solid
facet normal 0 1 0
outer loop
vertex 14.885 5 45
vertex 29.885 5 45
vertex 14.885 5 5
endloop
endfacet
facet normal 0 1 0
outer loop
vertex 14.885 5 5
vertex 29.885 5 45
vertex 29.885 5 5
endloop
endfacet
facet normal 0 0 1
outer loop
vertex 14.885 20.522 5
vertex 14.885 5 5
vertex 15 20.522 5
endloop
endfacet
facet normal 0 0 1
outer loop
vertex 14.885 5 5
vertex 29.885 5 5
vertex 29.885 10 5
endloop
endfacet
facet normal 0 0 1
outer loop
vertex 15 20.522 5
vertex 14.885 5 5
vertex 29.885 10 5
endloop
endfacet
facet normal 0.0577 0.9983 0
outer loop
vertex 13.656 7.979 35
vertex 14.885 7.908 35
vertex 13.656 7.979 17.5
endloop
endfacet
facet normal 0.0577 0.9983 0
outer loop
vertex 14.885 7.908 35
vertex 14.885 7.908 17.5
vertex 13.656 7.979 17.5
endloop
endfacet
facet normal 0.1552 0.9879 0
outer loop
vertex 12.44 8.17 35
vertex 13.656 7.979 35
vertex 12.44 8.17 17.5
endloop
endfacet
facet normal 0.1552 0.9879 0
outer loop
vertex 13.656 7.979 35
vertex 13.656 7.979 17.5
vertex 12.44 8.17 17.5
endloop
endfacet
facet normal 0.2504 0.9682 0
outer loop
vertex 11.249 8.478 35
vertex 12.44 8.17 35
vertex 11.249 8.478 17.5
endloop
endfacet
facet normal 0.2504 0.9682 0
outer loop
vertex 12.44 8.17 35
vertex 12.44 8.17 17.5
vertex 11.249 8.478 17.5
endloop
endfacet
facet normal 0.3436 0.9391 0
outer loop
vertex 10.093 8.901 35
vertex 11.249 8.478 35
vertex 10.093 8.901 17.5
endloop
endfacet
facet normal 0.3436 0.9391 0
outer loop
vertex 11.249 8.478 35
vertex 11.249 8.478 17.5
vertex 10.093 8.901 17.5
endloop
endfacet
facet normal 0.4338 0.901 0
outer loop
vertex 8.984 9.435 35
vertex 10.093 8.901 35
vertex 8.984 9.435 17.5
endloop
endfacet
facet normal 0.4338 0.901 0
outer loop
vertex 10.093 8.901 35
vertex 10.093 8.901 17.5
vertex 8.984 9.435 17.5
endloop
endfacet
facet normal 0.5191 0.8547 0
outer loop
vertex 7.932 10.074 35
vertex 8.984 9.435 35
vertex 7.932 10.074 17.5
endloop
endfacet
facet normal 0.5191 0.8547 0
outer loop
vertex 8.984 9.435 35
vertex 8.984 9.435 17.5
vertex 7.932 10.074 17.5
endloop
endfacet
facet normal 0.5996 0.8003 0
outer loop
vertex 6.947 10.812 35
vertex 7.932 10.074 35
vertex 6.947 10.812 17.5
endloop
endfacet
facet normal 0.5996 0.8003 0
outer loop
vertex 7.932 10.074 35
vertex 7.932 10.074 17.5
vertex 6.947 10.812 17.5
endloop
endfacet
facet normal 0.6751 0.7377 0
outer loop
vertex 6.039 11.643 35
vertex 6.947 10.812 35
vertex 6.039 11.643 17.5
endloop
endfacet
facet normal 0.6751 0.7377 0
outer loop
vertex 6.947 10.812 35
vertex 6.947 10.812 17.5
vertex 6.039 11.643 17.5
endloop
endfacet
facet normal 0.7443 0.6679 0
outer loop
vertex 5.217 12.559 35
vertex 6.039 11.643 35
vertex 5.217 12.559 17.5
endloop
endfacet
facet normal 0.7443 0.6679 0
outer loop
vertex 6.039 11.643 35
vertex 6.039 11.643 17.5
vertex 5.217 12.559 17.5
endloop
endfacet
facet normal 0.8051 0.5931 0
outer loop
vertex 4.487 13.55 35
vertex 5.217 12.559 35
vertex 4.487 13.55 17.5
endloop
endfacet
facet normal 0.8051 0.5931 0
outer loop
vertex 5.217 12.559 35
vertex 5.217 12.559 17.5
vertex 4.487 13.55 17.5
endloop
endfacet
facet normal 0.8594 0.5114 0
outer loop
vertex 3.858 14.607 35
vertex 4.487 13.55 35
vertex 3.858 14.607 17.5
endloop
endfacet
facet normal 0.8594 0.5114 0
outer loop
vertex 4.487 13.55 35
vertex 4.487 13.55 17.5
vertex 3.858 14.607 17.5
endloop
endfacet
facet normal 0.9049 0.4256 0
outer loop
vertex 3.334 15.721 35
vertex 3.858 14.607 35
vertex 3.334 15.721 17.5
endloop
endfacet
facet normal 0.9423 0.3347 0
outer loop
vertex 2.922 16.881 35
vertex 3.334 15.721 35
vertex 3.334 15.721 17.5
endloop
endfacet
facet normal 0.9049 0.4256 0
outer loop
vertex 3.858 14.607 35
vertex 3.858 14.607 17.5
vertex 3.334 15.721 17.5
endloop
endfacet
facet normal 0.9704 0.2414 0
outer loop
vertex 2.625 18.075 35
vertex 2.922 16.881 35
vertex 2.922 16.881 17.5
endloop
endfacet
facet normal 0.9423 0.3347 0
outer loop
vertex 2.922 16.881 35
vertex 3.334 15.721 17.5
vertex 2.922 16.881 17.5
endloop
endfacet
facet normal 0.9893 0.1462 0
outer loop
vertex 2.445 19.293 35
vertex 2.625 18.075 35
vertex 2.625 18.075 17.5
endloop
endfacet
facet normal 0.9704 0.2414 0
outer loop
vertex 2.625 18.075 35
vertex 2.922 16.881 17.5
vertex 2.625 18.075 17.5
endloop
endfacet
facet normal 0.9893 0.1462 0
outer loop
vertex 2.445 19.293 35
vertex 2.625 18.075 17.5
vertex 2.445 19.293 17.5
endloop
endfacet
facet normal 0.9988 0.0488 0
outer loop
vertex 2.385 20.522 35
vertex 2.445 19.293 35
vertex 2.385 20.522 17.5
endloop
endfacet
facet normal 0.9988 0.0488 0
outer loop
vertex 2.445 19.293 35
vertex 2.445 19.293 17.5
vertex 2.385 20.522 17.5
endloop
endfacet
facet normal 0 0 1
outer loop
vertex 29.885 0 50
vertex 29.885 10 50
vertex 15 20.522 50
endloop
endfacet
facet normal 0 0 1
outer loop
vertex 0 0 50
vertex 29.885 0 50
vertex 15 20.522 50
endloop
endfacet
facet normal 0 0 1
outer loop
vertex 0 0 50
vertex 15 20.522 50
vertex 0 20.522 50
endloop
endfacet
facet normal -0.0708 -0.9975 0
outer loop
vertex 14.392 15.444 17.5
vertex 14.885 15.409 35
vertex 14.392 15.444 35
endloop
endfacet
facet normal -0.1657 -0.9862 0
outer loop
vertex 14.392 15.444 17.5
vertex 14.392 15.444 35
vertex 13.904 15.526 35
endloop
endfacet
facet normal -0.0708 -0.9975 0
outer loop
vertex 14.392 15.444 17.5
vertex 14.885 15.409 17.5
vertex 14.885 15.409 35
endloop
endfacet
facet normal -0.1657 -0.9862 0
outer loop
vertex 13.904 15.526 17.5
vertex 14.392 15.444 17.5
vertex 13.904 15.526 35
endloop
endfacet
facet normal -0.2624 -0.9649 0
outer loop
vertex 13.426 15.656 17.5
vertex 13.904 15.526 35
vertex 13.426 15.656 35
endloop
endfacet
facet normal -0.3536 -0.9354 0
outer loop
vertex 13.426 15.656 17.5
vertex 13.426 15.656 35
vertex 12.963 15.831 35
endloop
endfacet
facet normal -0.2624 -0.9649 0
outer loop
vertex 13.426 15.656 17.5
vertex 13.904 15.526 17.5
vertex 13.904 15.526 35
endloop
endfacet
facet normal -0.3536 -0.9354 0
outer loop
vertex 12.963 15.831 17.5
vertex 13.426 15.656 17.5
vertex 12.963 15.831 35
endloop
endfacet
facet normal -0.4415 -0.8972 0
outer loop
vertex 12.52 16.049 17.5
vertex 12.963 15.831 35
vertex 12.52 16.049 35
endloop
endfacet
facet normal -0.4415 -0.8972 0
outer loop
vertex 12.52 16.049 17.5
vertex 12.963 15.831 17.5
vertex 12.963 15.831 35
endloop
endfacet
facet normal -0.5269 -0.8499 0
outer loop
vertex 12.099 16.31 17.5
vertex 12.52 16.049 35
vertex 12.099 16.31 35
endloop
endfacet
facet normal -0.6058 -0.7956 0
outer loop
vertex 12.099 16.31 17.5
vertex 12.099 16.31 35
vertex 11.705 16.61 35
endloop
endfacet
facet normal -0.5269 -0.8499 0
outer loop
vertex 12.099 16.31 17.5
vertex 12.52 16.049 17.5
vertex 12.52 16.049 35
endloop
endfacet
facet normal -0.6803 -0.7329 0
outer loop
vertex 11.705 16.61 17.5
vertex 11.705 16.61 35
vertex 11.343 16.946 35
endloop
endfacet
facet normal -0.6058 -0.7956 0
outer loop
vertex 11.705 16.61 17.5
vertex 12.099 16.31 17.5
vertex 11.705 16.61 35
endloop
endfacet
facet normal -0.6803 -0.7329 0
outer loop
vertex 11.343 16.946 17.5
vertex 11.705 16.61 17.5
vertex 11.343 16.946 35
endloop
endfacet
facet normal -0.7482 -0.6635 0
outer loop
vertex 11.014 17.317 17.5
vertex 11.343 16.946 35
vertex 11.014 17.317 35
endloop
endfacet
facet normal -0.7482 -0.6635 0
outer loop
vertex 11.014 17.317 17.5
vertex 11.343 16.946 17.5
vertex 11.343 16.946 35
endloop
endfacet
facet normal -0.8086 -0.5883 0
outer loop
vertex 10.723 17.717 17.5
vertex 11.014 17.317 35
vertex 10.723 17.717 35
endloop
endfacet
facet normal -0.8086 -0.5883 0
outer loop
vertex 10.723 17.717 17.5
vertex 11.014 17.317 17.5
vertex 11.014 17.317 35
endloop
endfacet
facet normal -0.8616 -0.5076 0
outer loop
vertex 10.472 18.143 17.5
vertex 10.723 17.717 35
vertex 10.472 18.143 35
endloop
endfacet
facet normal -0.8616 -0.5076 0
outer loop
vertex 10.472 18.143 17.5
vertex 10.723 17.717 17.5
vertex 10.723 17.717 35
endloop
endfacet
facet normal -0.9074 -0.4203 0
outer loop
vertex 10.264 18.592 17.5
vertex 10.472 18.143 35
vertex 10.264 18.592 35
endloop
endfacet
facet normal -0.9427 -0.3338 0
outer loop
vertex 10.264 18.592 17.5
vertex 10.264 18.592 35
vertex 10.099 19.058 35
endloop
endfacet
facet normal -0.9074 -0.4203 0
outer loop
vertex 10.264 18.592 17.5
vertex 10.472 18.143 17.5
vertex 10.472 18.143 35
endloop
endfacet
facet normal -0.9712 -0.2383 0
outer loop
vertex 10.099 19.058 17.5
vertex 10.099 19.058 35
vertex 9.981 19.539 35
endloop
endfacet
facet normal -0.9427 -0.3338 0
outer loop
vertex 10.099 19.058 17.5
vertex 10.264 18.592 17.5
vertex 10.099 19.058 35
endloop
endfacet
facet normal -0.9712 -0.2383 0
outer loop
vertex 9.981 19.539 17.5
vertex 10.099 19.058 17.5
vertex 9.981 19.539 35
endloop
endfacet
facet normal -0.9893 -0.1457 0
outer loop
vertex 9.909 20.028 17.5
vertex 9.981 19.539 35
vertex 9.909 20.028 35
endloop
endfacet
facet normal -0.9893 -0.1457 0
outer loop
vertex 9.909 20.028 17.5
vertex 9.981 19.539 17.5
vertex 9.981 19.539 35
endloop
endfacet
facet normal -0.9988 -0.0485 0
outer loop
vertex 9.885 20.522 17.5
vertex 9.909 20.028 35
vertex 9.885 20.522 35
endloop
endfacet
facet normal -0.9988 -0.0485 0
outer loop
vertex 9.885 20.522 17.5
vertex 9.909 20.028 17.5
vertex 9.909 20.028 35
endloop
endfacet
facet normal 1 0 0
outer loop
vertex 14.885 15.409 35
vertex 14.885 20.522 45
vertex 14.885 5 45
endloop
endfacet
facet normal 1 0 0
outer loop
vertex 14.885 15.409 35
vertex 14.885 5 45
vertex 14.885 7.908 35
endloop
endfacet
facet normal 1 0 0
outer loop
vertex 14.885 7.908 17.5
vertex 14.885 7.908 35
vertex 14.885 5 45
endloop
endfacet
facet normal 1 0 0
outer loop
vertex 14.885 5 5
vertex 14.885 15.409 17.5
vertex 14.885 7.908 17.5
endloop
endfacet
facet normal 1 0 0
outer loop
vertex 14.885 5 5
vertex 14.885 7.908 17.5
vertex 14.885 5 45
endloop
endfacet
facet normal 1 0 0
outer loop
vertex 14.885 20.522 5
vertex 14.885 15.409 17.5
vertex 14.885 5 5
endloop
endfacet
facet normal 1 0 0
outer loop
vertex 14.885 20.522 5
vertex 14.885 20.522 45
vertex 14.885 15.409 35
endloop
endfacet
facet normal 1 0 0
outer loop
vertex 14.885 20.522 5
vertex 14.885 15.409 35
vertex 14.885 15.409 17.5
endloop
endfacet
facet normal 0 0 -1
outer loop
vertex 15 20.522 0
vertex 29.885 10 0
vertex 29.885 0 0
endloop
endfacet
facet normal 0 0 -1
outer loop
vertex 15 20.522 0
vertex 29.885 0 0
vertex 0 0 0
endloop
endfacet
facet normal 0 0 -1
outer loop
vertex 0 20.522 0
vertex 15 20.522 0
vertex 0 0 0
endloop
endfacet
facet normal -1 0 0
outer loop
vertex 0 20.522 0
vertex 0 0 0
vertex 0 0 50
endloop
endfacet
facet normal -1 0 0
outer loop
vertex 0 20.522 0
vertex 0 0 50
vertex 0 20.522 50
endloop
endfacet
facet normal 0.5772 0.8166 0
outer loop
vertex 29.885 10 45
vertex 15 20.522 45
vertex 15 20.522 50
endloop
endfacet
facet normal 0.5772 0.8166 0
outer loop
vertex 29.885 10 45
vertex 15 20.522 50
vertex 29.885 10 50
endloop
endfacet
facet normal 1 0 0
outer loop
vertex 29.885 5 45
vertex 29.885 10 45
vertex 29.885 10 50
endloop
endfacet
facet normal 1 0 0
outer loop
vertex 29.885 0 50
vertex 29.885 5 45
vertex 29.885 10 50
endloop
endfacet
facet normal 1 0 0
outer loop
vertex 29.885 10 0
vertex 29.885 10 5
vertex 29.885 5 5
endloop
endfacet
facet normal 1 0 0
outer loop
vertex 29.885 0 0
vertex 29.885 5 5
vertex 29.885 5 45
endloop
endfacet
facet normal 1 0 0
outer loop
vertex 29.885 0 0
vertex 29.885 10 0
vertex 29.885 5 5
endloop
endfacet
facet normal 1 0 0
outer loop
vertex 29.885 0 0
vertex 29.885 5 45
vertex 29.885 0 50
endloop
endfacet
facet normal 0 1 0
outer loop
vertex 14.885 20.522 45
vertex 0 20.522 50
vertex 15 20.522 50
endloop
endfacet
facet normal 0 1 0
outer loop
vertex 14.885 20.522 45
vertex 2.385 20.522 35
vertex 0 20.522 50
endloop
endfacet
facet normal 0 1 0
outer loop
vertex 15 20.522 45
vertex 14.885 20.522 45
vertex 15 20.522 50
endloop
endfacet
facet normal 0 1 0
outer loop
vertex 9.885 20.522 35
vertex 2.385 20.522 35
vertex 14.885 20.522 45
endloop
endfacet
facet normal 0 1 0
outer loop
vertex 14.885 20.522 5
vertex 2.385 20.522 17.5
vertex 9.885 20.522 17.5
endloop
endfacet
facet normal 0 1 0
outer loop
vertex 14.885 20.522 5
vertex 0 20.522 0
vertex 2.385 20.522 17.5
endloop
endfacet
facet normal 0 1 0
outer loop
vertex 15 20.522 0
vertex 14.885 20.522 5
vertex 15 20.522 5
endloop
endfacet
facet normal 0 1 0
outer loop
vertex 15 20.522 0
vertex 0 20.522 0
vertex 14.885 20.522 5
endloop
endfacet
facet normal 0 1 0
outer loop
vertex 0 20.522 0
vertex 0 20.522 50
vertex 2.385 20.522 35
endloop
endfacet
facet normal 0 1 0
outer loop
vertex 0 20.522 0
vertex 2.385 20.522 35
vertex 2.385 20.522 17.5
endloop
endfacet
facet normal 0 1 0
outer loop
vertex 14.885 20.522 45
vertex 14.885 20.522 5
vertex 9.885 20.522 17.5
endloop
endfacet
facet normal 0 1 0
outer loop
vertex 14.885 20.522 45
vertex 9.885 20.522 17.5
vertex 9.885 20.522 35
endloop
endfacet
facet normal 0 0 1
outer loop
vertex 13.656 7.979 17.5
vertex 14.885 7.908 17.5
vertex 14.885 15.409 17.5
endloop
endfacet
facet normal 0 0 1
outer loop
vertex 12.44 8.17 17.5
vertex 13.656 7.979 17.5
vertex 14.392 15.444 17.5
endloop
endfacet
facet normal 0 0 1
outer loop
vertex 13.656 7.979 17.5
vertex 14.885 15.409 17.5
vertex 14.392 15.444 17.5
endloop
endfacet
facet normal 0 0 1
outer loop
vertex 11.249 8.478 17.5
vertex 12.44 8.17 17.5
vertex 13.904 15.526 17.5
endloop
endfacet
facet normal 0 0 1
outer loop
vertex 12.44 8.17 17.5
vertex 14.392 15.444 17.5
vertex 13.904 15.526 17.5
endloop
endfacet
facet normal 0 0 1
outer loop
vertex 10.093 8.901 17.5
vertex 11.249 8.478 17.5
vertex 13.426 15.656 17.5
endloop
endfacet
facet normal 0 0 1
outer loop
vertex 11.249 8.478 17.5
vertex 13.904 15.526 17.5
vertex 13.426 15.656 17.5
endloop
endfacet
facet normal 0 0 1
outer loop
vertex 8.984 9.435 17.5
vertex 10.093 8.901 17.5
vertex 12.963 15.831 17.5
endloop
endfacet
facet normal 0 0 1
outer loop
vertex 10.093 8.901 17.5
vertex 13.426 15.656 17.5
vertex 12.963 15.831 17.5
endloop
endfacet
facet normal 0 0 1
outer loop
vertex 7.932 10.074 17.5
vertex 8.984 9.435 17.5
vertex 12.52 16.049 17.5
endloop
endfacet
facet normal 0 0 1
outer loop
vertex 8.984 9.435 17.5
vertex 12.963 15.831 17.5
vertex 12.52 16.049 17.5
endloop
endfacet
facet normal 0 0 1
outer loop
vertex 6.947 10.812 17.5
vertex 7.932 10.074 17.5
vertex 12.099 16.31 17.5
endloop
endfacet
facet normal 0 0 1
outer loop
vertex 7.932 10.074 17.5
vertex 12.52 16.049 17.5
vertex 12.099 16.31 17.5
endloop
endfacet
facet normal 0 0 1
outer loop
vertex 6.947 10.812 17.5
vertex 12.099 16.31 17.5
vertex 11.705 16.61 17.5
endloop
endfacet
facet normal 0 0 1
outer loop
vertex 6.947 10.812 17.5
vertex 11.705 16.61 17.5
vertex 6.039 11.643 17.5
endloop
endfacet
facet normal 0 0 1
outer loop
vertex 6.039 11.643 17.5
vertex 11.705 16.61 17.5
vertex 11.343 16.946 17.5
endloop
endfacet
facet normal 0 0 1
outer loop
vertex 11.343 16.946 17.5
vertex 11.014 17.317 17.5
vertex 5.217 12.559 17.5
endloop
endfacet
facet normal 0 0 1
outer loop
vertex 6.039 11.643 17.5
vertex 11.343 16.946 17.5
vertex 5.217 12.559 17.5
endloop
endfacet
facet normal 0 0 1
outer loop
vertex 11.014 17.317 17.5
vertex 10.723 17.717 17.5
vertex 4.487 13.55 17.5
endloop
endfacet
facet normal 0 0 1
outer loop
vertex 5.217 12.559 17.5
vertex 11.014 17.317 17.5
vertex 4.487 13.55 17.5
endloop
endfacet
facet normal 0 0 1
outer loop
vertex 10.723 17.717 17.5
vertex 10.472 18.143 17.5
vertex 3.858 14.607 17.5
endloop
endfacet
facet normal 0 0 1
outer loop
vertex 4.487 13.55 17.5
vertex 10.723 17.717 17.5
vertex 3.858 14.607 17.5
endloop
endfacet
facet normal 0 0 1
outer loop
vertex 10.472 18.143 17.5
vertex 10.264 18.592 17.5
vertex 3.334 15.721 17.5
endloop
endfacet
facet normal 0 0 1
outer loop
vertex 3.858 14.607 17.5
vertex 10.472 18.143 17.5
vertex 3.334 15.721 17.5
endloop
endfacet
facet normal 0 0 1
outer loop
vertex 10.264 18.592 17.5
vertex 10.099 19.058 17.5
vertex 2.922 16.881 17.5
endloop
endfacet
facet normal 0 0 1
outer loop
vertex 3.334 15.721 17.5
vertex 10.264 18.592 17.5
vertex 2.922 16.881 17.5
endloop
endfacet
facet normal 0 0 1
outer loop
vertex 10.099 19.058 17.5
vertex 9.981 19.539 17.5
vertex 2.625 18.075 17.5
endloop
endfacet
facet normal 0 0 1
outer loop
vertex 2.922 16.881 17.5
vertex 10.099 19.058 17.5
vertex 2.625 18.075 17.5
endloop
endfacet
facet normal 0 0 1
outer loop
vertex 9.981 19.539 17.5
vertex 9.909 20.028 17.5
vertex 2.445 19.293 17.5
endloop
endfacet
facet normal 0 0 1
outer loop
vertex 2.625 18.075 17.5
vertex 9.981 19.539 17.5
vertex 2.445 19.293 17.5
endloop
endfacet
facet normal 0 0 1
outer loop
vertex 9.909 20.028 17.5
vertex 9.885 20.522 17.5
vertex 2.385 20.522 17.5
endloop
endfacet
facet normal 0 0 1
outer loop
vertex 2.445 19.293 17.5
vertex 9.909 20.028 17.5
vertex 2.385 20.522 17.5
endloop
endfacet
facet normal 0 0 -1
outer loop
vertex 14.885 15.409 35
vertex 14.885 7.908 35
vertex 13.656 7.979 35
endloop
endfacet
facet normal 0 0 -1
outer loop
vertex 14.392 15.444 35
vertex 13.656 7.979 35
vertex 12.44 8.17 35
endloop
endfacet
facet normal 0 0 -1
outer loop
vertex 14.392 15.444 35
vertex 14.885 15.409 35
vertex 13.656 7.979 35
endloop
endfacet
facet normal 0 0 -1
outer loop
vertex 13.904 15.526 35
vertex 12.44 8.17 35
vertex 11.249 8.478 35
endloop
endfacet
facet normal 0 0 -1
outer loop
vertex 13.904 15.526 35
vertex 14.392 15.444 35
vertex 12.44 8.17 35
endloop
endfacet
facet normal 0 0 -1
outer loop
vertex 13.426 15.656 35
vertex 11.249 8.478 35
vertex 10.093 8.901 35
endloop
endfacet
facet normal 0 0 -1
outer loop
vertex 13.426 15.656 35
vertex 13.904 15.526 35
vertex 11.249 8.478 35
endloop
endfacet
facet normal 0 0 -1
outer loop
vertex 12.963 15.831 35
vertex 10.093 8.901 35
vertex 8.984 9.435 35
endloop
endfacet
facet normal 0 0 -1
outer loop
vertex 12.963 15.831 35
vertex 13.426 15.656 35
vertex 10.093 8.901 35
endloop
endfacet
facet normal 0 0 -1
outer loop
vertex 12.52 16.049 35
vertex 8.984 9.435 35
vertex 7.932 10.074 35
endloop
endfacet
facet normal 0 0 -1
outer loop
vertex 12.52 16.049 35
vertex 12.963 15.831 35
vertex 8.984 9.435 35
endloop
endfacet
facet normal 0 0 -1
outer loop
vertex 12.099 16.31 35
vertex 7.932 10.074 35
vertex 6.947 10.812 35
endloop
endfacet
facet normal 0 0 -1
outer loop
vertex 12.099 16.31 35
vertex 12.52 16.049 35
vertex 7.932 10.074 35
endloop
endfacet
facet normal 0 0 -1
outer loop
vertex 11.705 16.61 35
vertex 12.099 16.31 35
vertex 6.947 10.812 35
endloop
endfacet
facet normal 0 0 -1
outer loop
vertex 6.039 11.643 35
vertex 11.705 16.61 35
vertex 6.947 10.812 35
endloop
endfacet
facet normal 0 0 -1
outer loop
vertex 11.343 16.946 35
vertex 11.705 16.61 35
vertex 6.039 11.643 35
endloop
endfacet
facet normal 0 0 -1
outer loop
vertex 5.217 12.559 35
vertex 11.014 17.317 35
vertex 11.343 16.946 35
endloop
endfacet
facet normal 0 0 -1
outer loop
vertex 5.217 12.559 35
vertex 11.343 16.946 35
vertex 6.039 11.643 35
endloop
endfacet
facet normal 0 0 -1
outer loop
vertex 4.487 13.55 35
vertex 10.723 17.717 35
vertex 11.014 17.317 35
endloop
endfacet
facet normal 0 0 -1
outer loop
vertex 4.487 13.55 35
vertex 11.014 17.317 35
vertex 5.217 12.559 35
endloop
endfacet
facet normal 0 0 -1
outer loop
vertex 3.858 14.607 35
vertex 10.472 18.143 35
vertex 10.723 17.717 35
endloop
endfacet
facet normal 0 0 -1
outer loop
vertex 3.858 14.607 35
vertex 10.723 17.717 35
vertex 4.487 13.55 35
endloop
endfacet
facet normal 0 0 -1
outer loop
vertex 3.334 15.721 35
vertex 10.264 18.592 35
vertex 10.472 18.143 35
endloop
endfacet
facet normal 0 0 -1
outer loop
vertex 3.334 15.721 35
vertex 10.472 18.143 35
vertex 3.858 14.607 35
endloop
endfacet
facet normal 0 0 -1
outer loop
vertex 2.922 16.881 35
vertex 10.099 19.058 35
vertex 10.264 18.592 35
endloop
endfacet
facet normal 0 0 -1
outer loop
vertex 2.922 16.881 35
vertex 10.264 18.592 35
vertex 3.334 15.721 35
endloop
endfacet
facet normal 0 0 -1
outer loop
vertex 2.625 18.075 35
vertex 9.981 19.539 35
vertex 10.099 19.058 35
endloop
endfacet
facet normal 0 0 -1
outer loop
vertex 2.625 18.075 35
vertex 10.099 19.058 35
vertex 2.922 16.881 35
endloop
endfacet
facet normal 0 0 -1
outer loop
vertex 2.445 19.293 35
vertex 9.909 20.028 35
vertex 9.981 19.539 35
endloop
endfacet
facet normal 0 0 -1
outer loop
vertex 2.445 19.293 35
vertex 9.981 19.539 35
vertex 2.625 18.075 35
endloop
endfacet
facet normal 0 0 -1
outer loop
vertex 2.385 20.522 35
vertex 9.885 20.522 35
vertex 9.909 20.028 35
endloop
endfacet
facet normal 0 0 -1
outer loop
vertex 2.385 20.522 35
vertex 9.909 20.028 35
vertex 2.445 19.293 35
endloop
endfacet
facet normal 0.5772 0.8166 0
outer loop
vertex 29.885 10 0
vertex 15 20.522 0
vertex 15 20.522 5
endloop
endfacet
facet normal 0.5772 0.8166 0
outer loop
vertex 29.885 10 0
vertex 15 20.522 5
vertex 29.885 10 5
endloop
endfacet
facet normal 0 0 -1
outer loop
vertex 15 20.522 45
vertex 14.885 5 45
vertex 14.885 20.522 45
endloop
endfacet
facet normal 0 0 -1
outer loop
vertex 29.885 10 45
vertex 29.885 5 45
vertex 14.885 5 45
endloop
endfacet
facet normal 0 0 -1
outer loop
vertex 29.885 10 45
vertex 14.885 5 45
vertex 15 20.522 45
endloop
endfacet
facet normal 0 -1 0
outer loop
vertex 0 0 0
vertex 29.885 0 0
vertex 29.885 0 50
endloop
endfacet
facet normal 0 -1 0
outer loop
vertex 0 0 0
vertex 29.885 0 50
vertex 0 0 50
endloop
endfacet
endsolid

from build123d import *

# Parameters (mm, degrees)
BOSS_EXTRUDE1_DEPTH = 50
SKETCH4_W           = 40
SKETCH4_H           = 15.522388441
CUT_EXTRUDE1_DEPTH  = 15
SKETCH5_W           = 7.5
SKETCH5_H           = 17.5


with BuildPart() as part:
    # Sketch1 → Boss-Extrude1 (new body)
    with BuildSketch(Plane.XY):
        Polygon((0, 0), (0, 20.522388441), (15, 20.522388441), (29.885137085, 10), (29.885137085, 0), align=None)
    extrude(amount=BOSS_EXTRUDE1_DEPTH)

    # Sketch4 → Cut-Extrude1 (cut)
    with BuildSketch(Plane(origin=(29.885137085, 0, 0), x_dir=(0, 0, -1), z_dir=(1, 0, 0))):
        with Locations((-25, 12.761194221)):
            Rectangle(SKETCH4_W, SKETCH4_H)
    extrude(amount=-CUT_EXTRUDE1_DEPTH, mode=Mode.SUBTRACT)

    # Sketch5 → Cut-Revolve1 (revolve, cut)
    with BuildSketch(Plane(origin=(0, 20.522388441, 0), x_dir=(1, 0, 0), z_dir=(0, 1, 0))):
        with Locations((6.135137085, -26.25)):
            Rectangle(SKETCH5_W, SKETCH5_H)
    revolve(axis=Axis((15, 20.522388441, 50), (0, 0, -1)), mode=Mode.SUBTRACT)


solid = part.part
